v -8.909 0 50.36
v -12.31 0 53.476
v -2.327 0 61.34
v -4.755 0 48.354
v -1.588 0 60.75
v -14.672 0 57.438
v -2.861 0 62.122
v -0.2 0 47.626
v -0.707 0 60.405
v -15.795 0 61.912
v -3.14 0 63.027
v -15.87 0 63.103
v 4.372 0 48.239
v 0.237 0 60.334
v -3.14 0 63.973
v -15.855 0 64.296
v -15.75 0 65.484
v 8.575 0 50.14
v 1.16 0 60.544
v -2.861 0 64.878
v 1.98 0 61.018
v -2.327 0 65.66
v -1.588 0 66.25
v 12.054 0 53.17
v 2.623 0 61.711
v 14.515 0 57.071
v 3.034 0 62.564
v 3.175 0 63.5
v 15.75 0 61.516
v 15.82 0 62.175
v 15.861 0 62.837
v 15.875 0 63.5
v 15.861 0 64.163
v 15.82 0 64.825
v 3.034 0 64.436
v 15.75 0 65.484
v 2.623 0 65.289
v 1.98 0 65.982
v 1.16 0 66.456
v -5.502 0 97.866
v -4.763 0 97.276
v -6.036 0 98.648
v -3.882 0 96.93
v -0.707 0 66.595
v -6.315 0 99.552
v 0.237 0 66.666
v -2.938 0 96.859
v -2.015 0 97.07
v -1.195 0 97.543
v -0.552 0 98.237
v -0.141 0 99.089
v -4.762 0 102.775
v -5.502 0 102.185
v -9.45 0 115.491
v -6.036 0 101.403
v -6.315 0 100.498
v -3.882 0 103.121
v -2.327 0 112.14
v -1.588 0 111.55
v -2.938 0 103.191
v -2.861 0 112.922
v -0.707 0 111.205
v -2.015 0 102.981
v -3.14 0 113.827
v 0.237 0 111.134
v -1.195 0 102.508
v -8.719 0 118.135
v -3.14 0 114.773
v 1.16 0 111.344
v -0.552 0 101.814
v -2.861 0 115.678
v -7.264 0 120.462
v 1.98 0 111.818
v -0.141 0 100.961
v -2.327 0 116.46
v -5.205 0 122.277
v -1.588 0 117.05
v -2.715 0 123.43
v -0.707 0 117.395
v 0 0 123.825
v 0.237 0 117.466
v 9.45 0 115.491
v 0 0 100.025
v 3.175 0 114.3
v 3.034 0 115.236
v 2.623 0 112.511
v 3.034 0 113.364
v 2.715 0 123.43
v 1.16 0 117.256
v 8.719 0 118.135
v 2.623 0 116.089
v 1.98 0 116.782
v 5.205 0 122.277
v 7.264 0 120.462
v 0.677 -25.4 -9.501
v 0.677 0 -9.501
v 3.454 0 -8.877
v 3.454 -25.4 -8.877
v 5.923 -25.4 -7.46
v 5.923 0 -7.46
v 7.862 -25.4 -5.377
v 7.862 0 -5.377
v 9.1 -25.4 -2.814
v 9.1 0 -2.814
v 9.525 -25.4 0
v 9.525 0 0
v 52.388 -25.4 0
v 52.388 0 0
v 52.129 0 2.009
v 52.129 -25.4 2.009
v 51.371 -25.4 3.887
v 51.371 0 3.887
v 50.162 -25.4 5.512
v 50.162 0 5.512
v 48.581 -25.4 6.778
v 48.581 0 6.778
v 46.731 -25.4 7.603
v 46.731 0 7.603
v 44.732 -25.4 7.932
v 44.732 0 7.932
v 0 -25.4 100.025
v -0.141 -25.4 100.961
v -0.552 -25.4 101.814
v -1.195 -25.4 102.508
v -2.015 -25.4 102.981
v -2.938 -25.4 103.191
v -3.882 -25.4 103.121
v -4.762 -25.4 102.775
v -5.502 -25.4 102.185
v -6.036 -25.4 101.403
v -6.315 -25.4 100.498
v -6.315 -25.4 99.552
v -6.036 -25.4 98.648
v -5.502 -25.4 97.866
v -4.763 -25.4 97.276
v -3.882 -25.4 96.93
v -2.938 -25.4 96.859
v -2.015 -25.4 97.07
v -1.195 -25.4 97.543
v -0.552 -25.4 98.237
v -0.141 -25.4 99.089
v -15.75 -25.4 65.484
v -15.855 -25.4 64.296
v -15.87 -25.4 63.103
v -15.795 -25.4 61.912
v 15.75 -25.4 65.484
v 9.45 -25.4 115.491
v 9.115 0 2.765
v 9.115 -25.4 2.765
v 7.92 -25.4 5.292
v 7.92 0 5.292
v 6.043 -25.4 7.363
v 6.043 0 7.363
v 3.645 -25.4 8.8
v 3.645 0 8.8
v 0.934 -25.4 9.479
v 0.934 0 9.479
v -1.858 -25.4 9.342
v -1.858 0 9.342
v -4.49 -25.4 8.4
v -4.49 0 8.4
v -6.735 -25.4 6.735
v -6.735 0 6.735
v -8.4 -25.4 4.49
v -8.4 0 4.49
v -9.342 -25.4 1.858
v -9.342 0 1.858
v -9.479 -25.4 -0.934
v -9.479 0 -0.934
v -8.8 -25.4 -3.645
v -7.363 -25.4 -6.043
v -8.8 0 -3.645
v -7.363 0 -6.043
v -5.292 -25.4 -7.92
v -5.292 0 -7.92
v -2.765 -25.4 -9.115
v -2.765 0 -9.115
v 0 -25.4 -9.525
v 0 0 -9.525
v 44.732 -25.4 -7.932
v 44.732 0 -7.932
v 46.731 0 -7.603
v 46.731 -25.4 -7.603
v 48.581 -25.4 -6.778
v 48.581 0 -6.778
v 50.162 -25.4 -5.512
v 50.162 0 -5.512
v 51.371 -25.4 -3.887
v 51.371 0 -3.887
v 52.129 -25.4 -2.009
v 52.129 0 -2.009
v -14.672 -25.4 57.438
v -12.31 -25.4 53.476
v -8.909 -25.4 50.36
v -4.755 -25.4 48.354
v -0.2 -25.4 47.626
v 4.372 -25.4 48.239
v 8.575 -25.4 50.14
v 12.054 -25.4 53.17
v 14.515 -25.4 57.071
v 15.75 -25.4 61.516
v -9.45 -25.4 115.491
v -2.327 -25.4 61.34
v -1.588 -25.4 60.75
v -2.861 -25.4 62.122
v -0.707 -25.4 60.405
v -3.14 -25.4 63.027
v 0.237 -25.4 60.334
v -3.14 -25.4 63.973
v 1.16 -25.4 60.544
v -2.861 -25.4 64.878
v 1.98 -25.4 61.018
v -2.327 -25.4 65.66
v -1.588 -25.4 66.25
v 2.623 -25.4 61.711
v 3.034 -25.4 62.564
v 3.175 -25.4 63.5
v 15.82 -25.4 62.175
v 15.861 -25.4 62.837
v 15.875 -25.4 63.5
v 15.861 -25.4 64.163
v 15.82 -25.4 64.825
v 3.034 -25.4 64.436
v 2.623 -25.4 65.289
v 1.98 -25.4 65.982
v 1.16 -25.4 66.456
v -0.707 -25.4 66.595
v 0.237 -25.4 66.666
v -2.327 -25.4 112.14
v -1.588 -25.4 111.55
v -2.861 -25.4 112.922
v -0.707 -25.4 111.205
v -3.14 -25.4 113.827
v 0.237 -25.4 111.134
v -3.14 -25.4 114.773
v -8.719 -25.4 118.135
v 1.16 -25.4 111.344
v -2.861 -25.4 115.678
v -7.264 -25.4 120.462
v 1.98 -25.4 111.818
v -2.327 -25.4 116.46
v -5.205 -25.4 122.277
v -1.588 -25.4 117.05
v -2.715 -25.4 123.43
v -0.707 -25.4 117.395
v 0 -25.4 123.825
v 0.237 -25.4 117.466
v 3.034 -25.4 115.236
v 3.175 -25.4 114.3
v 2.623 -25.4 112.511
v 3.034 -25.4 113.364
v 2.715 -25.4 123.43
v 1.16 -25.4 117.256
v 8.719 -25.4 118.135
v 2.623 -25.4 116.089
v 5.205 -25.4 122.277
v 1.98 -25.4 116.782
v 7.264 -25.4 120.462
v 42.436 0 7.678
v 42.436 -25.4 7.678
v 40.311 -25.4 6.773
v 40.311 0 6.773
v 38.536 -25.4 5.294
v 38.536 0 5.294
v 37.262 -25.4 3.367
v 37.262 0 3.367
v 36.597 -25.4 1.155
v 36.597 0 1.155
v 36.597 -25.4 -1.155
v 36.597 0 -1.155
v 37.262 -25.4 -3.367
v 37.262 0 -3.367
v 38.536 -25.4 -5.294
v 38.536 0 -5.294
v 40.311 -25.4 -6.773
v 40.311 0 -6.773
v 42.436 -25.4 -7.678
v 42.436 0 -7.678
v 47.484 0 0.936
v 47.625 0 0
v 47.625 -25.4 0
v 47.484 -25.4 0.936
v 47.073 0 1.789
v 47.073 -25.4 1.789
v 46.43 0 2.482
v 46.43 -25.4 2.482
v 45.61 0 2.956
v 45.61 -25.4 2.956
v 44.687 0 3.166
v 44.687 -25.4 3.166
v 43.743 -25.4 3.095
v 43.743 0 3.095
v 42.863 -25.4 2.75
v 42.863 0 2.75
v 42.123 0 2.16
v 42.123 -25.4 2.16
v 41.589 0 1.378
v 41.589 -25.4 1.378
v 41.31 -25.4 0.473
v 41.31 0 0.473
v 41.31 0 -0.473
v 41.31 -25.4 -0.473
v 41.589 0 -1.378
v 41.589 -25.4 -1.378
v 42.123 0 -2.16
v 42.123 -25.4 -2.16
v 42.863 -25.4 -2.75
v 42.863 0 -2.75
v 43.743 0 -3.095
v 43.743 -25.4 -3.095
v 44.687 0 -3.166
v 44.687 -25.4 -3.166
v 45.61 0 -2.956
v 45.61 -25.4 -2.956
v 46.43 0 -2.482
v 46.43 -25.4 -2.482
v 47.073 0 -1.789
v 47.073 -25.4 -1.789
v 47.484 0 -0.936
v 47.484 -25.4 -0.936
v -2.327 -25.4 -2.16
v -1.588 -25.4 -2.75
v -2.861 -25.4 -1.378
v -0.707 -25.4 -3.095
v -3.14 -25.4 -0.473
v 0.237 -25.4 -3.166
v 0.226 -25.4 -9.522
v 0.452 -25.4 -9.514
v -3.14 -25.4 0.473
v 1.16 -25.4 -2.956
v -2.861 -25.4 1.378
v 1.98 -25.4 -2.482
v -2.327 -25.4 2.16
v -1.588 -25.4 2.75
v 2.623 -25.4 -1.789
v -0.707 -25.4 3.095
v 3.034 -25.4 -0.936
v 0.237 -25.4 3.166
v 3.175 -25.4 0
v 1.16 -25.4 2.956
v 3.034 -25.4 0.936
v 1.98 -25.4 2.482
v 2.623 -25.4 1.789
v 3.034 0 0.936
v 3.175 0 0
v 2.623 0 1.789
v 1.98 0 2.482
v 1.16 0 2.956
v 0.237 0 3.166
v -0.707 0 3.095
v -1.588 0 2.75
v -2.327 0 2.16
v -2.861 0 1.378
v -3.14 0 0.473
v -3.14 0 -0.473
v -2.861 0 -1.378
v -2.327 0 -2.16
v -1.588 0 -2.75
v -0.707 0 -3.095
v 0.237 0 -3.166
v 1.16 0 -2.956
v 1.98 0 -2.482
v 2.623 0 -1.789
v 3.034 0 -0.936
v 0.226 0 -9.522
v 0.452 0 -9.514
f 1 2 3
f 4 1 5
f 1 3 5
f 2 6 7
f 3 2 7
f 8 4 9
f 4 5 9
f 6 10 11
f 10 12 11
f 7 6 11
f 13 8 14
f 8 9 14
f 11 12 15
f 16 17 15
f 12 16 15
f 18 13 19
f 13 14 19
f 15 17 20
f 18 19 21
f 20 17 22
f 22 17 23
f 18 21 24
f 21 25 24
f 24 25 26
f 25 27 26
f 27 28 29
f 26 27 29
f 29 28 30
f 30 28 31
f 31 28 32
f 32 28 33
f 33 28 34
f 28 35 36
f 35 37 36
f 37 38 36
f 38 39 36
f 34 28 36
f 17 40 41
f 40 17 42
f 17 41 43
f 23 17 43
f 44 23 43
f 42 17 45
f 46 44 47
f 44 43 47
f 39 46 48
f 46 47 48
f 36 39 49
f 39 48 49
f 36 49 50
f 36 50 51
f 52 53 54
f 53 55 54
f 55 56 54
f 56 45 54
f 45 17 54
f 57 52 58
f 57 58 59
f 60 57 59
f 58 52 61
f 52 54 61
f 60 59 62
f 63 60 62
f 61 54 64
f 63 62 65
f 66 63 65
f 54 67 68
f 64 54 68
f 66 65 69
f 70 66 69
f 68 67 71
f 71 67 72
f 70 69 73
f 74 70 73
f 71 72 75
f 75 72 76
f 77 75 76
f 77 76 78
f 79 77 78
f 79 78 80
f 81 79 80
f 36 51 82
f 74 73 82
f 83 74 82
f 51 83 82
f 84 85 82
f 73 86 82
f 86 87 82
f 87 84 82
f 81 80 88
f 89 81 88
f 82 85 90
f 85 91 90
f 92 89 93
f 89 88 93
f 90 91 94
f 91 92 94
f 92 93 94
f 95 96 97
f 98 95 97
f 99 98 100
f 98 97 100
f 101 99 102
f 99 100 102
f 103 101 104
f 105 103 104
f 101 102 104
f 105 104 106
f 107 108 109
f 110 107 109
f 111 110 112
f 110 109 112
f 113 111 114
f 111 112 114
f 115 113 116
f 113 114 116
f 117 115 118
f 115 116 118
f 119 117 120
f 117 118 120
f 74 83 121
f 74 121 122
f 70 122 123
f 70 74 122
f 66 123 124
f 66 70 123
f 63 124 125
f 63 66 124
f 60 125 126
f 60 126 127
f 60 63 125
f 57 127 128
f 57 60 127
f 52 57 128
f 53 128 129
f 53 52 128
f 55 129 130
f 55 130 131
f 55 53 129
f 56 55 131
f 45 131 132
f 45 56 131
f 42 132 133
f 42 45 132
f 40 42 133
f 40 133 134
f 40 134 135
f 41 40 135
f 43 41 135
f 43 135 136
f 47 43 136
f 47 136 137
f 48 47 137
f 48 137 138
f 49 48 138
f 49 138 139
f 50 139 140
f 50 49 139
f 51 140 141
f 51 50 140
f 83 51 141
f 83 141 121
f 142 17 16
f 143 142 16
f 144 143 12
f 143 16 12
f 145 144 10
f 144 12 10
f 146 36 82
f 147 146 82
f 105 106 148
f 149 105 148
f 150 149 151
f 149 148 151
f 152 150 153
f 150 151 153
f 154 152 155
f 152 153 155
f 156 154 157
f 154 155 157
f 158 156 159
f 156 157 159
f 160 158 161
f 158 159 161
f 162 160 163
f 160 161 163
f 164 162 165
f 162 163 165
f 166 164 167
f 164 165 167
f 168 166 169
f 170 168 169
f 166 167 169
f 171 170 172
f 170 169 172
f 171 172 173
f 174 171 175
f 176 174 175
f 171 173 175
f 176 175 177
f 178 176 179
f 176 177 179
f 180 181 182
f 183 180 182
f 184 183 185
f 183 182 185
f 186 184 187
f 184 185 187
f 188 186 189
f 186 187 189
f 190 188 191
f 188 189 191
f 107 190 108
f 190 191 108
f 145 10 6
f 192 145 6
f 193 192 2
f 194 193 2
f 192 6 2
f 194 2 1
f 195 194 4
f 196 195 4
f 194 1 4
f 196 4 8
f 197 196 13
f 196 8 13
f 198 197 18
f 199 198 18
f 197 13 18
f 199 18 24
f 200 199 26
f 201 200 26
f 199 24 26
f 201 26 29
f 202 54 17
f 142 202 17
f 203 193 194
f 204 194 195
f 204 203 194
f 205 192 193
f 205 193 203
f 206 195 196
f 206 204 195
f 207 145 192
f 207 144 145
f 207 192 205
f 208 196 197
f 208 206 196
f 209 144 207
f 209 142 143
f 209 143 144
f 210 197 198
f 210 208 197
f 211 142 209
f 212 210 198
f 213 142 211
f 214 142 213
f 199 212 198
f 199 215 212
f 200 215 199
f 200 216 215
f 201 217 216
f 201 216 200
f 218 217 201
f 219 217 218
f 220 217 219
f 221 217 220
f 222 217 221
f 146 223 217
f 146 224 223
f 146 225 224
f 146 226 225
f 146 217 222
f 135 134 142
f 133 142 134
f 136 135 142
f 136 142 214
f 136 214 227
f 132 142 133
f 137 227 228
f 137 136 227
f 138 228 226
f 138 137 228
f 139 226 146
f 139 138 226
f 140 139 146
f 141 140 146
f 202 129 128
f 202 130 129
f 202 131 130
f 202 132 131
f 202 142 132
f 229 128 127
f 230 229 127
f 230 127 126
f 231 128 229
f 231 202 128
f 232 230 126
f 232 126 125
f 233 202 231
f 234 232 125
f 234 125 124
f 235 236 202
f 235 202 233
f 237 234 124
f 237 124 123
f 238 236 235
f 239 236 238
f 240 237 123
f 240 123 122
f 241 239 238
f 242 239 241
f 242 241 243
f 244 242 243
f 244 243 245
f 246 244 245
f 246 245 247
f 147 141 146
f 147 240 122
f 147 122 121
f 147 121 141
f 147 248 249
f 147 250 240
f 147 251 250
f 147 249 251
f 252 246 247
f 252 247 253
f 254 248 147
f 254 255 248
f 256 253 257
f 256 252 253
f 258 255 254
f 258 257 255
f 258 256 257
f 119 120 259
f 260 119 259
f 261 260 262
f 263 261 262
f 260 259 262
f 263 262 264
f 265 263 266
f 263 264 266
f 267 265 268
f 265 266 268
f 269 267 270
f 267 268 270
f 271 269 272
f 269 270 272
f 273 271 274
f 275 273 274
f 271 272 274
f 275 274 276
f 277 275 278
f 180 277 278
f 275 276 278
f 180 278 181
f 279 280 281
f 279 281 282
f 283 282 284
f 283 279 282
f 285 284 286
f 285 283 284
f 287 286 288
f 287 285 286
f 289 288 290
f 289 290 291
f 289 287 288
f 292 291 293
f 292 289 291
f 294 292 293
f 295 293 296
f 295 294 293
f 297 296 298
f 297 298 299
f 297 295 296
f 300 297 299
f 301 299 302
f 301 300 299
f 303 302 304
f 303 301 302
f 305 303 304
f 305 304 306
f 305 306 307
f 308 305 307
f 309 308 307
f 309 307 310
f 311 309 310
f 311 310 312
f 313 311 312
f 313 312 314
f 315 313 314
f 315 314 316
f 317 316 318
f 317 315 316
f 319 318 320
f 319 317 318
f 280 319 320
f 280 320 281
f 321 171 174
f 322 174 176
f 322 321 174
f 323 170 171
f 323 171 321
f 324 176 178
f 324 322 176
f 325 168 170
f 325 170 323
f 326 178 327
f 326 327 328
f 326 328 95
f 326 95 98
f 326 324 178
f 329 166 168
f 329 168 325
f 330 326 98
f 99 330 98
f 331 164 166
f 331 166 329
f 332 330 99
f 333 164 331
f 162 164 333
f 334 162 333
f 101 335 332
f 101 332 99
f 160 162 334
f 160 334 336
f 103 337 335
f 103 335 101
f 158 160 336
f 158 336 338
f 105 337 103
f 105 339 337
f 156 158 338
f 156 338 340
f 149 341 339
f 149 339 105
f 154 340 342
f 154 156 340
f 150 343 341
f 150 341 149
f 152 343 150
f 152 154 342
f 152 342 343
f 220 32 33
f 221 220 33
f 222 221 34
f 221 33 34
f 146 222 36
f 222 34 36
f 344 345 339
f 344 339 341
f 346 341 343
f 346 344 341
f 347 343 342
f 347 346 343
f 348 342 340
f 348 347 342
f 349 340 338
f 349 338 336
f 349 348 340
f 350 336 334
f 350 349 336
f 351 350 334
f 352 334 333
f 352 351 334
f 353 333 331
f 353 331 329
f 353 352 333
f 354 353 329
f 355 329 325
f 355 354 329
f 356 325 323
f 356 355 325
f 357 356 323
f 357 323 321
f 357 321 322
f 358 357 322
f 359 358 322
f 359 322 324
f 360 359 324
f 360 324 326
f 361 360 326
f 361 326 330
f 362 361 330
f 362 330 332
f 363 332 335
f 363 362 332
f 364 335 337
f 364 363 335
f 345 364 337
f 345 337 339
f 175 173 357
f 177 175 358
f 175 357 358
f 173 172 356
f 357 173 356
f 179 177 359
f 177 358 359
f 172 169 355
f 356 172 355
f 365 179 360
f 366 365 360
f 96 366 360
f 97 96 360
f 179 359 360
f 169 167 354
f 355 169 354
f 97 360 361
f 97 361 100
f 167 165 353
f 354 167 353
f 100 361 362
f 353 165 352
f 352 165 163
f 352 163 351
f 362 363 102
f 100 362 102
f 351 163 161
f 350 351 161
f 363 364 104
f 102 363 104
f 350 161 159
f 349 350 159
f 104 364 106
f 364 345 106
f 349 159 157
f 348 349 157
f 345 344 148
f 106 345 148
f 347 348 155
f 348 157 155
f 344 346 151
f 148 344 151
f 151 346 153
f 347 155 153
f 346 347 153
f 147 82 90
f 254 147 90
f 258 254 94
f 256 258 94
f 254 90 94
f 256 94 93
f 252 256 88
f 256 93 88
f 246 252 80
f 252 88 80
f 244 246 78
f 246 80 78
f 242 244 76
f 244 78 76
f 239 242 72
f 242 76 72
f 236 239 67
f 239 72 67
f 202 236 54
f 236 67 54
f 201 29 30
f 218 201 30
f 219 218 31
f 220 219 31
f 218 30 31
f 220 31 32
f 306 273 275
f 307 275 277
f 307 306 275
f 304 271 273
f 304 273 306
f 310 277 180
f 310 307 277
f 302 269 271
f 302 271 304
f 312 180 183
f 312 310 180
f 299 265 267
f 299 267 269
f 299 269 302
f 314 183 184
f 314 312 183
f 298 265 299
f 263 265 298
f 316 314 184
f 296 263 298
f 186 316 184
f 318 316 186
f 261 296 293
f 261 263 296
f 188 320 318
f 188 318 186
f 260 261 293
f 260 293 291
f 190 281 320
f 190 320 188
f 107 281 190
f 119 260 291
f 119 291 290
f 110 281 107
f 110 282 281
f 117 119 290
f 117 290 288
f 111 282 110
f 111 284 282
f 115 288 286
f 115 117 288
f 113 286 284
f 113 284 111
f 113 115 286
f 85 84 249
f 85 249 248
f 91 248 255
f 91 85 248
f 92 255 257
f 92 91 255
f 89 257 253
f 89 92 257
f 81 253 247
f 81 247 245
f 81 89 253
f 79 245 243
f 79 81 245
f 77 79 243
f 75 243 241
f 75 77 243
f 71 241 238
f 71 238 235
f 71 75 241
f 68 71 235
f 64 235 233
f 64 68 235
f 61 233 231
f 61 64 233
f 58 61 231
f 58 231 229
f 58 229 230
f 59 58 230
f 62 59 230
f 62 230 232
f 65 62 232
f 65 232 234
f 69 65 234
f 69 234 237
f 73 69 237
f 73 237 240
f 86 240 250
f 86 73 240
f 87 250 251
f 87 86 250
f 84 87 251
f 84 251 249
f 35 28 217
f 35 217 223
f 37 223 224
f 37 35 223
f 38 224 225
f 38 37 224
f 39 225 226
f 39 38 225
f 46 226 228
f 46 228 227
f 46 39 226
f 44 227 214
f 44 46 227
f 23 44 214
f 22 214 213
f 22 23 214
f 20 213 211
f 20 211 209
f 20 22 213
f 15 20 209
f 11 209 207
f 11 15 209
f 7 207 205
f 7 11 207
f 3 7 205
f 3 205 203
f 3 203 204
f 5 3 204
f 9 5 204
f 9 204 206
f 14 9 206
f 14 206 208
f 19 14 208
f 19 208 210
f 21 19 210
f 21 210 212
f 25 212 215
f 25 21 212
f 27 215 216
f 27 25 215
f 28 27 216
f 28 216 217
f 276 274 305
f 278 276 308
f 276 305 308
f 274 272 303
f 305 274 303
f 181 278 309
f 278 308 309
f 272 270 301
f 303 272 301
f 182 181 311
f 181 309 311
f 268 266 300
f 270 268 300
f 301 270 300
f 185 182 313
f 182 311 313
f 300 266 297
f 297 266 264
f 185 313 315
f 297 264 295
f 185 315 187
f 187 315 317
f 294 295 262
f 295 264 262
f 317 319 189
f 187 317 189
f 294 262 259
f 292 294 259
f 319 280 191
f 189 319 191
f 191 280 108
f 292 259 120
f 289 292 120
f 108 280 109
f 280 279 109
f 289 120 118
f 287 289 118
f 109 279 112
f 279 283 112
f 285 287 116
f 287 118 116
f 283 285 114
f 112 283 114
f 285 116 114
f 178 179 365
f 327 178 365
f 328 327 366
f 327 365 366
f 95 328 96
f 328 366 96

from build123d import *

# Parameters (mm, degrees)
F0_R     = 3.175
F1_DEPTH = 25.4


with BuildPart() as f1:
    # F0 (on Front) → F1 (new body)
    with BuildSketch(Plane.XZ):
        with BuildLine():
            Line((0.6773435479, -9.500885786), (0, -9.525))
            ThreePointArc((0, -9.525), (0.3388863295, -9.5189695375), (0.6773435479, -9.500885786))
        make_face()
        with BuildLine():
            ThreePointArc((0.6773435479, -9.500885786), (6.9705567315, -6.4912990883), (9.525, 0))
            ThreePointArc((9.525, 0), (-6.7351920908, 6.7351920908), (0, -9.525))
            Line((0, -9.525), (0.6773435479, -9.500885786))
        make_face()
        Circle(F0_R, mode=Mode.SUBTRACT)
    extrude(amount=F1_DEPTH)


with BuildPart() as f1b:
    # F0 (on Front) → F1, piece 2 (new body)
    with BuildSketch(Plane.XZ):
        with BuildLine():
            ThreePointArc((44.7324052746, 7.9324746146), (36.5125, 0), (44.7324052746, -7.9324746146))
            ThreePointArc((44.7324052746, -7.9324746146), (50.1616327839, -5.5119104847), (52.3875, 0))
            ThreePointArc((52.3875, 0), (50.1616327839, 5.5119104847), (44.7324052746, 7.9324746146))
        make_face()
        with Locations((44.45, 0)):
            Circle(F0_R, mode=Mode.SUBTRACT)
    extrude(amount=F1_DEPTH)


with BuildPart() as f1c:
    # F0 (on Front) → F1, piece 3 (new body)
    with BuildSketch(Plane.XZ):
        with BuildLine():
            ThreePointArc((-15.7954255641, 61.9125), (-0.1997054867, 47.6262561845), (15.7504882737, 61.515625))
            ThreePointArc((15.7504882737, 61.515625), (15.8438414904, 62.5058612634), (15.875, 63.5))
            ThreePointArc((15.875, 63.5), (15.8438414904, 64.4941387366), (15.7504882737, 65.484375))
            ThreePointArc((15.7504882737, 65.484375), (0, 79.375), (-15.7504882737, 65.484375))
            ThreePointArc((-15.7504882737, 65.484375), (-15.8737438155, 63.6997054867), (-15.7954255641, 61.9125))
        make_face()
        with Locations((0, 63.5)):
            Circle(F0_R, mode=Mode.SUBTRACT)
        with BuildLine():
            Line((-9.4502929642, 115.490625), (-15.7504882737, 65.484375))
            ThreePointArc((-15.7504882737, 65.484375), (0, 79.375), (15.7504882737, 65.484375))
            Line((15.7504882737, 65.484375), (9.4502929642, 115.490625))
            ThreePointArc((9.4502929642, 115.490625), (9.5063048942, 114.896483242), (9.525, 114.3))
            ThreePointArc((9.525, 114.3), (-0.596483242, 104.7936951058), (-9.4502929642, 115.490625))
        make_face()
        with Locations((-3.175, 100.0252)):
            Circle(F0_R, mode=Mode.SUBTRACT)
        with BuildLine():
            ThreePointArc((9.4502929642, 115.490625), (0, 123.825), (-9.4502929642, 115.490625))
            ThreePointArc((-9.4502929642, 115.490625), (-0.596483242, 104.7936951058), (9.525, 114.3))
            ThreePointArc((9.525, 114.3), (9.5063048942, 114.896483242), (9.4502929642, 115.490625))
        make_face()
        with Locations((0, 114.3)):
            Circle(F0_R, mode=Mode.SUBTRACT)
    extrude(amount=F1_DEPTH)


solid = Compound([f1.part, f1b.part, f1c.part])
